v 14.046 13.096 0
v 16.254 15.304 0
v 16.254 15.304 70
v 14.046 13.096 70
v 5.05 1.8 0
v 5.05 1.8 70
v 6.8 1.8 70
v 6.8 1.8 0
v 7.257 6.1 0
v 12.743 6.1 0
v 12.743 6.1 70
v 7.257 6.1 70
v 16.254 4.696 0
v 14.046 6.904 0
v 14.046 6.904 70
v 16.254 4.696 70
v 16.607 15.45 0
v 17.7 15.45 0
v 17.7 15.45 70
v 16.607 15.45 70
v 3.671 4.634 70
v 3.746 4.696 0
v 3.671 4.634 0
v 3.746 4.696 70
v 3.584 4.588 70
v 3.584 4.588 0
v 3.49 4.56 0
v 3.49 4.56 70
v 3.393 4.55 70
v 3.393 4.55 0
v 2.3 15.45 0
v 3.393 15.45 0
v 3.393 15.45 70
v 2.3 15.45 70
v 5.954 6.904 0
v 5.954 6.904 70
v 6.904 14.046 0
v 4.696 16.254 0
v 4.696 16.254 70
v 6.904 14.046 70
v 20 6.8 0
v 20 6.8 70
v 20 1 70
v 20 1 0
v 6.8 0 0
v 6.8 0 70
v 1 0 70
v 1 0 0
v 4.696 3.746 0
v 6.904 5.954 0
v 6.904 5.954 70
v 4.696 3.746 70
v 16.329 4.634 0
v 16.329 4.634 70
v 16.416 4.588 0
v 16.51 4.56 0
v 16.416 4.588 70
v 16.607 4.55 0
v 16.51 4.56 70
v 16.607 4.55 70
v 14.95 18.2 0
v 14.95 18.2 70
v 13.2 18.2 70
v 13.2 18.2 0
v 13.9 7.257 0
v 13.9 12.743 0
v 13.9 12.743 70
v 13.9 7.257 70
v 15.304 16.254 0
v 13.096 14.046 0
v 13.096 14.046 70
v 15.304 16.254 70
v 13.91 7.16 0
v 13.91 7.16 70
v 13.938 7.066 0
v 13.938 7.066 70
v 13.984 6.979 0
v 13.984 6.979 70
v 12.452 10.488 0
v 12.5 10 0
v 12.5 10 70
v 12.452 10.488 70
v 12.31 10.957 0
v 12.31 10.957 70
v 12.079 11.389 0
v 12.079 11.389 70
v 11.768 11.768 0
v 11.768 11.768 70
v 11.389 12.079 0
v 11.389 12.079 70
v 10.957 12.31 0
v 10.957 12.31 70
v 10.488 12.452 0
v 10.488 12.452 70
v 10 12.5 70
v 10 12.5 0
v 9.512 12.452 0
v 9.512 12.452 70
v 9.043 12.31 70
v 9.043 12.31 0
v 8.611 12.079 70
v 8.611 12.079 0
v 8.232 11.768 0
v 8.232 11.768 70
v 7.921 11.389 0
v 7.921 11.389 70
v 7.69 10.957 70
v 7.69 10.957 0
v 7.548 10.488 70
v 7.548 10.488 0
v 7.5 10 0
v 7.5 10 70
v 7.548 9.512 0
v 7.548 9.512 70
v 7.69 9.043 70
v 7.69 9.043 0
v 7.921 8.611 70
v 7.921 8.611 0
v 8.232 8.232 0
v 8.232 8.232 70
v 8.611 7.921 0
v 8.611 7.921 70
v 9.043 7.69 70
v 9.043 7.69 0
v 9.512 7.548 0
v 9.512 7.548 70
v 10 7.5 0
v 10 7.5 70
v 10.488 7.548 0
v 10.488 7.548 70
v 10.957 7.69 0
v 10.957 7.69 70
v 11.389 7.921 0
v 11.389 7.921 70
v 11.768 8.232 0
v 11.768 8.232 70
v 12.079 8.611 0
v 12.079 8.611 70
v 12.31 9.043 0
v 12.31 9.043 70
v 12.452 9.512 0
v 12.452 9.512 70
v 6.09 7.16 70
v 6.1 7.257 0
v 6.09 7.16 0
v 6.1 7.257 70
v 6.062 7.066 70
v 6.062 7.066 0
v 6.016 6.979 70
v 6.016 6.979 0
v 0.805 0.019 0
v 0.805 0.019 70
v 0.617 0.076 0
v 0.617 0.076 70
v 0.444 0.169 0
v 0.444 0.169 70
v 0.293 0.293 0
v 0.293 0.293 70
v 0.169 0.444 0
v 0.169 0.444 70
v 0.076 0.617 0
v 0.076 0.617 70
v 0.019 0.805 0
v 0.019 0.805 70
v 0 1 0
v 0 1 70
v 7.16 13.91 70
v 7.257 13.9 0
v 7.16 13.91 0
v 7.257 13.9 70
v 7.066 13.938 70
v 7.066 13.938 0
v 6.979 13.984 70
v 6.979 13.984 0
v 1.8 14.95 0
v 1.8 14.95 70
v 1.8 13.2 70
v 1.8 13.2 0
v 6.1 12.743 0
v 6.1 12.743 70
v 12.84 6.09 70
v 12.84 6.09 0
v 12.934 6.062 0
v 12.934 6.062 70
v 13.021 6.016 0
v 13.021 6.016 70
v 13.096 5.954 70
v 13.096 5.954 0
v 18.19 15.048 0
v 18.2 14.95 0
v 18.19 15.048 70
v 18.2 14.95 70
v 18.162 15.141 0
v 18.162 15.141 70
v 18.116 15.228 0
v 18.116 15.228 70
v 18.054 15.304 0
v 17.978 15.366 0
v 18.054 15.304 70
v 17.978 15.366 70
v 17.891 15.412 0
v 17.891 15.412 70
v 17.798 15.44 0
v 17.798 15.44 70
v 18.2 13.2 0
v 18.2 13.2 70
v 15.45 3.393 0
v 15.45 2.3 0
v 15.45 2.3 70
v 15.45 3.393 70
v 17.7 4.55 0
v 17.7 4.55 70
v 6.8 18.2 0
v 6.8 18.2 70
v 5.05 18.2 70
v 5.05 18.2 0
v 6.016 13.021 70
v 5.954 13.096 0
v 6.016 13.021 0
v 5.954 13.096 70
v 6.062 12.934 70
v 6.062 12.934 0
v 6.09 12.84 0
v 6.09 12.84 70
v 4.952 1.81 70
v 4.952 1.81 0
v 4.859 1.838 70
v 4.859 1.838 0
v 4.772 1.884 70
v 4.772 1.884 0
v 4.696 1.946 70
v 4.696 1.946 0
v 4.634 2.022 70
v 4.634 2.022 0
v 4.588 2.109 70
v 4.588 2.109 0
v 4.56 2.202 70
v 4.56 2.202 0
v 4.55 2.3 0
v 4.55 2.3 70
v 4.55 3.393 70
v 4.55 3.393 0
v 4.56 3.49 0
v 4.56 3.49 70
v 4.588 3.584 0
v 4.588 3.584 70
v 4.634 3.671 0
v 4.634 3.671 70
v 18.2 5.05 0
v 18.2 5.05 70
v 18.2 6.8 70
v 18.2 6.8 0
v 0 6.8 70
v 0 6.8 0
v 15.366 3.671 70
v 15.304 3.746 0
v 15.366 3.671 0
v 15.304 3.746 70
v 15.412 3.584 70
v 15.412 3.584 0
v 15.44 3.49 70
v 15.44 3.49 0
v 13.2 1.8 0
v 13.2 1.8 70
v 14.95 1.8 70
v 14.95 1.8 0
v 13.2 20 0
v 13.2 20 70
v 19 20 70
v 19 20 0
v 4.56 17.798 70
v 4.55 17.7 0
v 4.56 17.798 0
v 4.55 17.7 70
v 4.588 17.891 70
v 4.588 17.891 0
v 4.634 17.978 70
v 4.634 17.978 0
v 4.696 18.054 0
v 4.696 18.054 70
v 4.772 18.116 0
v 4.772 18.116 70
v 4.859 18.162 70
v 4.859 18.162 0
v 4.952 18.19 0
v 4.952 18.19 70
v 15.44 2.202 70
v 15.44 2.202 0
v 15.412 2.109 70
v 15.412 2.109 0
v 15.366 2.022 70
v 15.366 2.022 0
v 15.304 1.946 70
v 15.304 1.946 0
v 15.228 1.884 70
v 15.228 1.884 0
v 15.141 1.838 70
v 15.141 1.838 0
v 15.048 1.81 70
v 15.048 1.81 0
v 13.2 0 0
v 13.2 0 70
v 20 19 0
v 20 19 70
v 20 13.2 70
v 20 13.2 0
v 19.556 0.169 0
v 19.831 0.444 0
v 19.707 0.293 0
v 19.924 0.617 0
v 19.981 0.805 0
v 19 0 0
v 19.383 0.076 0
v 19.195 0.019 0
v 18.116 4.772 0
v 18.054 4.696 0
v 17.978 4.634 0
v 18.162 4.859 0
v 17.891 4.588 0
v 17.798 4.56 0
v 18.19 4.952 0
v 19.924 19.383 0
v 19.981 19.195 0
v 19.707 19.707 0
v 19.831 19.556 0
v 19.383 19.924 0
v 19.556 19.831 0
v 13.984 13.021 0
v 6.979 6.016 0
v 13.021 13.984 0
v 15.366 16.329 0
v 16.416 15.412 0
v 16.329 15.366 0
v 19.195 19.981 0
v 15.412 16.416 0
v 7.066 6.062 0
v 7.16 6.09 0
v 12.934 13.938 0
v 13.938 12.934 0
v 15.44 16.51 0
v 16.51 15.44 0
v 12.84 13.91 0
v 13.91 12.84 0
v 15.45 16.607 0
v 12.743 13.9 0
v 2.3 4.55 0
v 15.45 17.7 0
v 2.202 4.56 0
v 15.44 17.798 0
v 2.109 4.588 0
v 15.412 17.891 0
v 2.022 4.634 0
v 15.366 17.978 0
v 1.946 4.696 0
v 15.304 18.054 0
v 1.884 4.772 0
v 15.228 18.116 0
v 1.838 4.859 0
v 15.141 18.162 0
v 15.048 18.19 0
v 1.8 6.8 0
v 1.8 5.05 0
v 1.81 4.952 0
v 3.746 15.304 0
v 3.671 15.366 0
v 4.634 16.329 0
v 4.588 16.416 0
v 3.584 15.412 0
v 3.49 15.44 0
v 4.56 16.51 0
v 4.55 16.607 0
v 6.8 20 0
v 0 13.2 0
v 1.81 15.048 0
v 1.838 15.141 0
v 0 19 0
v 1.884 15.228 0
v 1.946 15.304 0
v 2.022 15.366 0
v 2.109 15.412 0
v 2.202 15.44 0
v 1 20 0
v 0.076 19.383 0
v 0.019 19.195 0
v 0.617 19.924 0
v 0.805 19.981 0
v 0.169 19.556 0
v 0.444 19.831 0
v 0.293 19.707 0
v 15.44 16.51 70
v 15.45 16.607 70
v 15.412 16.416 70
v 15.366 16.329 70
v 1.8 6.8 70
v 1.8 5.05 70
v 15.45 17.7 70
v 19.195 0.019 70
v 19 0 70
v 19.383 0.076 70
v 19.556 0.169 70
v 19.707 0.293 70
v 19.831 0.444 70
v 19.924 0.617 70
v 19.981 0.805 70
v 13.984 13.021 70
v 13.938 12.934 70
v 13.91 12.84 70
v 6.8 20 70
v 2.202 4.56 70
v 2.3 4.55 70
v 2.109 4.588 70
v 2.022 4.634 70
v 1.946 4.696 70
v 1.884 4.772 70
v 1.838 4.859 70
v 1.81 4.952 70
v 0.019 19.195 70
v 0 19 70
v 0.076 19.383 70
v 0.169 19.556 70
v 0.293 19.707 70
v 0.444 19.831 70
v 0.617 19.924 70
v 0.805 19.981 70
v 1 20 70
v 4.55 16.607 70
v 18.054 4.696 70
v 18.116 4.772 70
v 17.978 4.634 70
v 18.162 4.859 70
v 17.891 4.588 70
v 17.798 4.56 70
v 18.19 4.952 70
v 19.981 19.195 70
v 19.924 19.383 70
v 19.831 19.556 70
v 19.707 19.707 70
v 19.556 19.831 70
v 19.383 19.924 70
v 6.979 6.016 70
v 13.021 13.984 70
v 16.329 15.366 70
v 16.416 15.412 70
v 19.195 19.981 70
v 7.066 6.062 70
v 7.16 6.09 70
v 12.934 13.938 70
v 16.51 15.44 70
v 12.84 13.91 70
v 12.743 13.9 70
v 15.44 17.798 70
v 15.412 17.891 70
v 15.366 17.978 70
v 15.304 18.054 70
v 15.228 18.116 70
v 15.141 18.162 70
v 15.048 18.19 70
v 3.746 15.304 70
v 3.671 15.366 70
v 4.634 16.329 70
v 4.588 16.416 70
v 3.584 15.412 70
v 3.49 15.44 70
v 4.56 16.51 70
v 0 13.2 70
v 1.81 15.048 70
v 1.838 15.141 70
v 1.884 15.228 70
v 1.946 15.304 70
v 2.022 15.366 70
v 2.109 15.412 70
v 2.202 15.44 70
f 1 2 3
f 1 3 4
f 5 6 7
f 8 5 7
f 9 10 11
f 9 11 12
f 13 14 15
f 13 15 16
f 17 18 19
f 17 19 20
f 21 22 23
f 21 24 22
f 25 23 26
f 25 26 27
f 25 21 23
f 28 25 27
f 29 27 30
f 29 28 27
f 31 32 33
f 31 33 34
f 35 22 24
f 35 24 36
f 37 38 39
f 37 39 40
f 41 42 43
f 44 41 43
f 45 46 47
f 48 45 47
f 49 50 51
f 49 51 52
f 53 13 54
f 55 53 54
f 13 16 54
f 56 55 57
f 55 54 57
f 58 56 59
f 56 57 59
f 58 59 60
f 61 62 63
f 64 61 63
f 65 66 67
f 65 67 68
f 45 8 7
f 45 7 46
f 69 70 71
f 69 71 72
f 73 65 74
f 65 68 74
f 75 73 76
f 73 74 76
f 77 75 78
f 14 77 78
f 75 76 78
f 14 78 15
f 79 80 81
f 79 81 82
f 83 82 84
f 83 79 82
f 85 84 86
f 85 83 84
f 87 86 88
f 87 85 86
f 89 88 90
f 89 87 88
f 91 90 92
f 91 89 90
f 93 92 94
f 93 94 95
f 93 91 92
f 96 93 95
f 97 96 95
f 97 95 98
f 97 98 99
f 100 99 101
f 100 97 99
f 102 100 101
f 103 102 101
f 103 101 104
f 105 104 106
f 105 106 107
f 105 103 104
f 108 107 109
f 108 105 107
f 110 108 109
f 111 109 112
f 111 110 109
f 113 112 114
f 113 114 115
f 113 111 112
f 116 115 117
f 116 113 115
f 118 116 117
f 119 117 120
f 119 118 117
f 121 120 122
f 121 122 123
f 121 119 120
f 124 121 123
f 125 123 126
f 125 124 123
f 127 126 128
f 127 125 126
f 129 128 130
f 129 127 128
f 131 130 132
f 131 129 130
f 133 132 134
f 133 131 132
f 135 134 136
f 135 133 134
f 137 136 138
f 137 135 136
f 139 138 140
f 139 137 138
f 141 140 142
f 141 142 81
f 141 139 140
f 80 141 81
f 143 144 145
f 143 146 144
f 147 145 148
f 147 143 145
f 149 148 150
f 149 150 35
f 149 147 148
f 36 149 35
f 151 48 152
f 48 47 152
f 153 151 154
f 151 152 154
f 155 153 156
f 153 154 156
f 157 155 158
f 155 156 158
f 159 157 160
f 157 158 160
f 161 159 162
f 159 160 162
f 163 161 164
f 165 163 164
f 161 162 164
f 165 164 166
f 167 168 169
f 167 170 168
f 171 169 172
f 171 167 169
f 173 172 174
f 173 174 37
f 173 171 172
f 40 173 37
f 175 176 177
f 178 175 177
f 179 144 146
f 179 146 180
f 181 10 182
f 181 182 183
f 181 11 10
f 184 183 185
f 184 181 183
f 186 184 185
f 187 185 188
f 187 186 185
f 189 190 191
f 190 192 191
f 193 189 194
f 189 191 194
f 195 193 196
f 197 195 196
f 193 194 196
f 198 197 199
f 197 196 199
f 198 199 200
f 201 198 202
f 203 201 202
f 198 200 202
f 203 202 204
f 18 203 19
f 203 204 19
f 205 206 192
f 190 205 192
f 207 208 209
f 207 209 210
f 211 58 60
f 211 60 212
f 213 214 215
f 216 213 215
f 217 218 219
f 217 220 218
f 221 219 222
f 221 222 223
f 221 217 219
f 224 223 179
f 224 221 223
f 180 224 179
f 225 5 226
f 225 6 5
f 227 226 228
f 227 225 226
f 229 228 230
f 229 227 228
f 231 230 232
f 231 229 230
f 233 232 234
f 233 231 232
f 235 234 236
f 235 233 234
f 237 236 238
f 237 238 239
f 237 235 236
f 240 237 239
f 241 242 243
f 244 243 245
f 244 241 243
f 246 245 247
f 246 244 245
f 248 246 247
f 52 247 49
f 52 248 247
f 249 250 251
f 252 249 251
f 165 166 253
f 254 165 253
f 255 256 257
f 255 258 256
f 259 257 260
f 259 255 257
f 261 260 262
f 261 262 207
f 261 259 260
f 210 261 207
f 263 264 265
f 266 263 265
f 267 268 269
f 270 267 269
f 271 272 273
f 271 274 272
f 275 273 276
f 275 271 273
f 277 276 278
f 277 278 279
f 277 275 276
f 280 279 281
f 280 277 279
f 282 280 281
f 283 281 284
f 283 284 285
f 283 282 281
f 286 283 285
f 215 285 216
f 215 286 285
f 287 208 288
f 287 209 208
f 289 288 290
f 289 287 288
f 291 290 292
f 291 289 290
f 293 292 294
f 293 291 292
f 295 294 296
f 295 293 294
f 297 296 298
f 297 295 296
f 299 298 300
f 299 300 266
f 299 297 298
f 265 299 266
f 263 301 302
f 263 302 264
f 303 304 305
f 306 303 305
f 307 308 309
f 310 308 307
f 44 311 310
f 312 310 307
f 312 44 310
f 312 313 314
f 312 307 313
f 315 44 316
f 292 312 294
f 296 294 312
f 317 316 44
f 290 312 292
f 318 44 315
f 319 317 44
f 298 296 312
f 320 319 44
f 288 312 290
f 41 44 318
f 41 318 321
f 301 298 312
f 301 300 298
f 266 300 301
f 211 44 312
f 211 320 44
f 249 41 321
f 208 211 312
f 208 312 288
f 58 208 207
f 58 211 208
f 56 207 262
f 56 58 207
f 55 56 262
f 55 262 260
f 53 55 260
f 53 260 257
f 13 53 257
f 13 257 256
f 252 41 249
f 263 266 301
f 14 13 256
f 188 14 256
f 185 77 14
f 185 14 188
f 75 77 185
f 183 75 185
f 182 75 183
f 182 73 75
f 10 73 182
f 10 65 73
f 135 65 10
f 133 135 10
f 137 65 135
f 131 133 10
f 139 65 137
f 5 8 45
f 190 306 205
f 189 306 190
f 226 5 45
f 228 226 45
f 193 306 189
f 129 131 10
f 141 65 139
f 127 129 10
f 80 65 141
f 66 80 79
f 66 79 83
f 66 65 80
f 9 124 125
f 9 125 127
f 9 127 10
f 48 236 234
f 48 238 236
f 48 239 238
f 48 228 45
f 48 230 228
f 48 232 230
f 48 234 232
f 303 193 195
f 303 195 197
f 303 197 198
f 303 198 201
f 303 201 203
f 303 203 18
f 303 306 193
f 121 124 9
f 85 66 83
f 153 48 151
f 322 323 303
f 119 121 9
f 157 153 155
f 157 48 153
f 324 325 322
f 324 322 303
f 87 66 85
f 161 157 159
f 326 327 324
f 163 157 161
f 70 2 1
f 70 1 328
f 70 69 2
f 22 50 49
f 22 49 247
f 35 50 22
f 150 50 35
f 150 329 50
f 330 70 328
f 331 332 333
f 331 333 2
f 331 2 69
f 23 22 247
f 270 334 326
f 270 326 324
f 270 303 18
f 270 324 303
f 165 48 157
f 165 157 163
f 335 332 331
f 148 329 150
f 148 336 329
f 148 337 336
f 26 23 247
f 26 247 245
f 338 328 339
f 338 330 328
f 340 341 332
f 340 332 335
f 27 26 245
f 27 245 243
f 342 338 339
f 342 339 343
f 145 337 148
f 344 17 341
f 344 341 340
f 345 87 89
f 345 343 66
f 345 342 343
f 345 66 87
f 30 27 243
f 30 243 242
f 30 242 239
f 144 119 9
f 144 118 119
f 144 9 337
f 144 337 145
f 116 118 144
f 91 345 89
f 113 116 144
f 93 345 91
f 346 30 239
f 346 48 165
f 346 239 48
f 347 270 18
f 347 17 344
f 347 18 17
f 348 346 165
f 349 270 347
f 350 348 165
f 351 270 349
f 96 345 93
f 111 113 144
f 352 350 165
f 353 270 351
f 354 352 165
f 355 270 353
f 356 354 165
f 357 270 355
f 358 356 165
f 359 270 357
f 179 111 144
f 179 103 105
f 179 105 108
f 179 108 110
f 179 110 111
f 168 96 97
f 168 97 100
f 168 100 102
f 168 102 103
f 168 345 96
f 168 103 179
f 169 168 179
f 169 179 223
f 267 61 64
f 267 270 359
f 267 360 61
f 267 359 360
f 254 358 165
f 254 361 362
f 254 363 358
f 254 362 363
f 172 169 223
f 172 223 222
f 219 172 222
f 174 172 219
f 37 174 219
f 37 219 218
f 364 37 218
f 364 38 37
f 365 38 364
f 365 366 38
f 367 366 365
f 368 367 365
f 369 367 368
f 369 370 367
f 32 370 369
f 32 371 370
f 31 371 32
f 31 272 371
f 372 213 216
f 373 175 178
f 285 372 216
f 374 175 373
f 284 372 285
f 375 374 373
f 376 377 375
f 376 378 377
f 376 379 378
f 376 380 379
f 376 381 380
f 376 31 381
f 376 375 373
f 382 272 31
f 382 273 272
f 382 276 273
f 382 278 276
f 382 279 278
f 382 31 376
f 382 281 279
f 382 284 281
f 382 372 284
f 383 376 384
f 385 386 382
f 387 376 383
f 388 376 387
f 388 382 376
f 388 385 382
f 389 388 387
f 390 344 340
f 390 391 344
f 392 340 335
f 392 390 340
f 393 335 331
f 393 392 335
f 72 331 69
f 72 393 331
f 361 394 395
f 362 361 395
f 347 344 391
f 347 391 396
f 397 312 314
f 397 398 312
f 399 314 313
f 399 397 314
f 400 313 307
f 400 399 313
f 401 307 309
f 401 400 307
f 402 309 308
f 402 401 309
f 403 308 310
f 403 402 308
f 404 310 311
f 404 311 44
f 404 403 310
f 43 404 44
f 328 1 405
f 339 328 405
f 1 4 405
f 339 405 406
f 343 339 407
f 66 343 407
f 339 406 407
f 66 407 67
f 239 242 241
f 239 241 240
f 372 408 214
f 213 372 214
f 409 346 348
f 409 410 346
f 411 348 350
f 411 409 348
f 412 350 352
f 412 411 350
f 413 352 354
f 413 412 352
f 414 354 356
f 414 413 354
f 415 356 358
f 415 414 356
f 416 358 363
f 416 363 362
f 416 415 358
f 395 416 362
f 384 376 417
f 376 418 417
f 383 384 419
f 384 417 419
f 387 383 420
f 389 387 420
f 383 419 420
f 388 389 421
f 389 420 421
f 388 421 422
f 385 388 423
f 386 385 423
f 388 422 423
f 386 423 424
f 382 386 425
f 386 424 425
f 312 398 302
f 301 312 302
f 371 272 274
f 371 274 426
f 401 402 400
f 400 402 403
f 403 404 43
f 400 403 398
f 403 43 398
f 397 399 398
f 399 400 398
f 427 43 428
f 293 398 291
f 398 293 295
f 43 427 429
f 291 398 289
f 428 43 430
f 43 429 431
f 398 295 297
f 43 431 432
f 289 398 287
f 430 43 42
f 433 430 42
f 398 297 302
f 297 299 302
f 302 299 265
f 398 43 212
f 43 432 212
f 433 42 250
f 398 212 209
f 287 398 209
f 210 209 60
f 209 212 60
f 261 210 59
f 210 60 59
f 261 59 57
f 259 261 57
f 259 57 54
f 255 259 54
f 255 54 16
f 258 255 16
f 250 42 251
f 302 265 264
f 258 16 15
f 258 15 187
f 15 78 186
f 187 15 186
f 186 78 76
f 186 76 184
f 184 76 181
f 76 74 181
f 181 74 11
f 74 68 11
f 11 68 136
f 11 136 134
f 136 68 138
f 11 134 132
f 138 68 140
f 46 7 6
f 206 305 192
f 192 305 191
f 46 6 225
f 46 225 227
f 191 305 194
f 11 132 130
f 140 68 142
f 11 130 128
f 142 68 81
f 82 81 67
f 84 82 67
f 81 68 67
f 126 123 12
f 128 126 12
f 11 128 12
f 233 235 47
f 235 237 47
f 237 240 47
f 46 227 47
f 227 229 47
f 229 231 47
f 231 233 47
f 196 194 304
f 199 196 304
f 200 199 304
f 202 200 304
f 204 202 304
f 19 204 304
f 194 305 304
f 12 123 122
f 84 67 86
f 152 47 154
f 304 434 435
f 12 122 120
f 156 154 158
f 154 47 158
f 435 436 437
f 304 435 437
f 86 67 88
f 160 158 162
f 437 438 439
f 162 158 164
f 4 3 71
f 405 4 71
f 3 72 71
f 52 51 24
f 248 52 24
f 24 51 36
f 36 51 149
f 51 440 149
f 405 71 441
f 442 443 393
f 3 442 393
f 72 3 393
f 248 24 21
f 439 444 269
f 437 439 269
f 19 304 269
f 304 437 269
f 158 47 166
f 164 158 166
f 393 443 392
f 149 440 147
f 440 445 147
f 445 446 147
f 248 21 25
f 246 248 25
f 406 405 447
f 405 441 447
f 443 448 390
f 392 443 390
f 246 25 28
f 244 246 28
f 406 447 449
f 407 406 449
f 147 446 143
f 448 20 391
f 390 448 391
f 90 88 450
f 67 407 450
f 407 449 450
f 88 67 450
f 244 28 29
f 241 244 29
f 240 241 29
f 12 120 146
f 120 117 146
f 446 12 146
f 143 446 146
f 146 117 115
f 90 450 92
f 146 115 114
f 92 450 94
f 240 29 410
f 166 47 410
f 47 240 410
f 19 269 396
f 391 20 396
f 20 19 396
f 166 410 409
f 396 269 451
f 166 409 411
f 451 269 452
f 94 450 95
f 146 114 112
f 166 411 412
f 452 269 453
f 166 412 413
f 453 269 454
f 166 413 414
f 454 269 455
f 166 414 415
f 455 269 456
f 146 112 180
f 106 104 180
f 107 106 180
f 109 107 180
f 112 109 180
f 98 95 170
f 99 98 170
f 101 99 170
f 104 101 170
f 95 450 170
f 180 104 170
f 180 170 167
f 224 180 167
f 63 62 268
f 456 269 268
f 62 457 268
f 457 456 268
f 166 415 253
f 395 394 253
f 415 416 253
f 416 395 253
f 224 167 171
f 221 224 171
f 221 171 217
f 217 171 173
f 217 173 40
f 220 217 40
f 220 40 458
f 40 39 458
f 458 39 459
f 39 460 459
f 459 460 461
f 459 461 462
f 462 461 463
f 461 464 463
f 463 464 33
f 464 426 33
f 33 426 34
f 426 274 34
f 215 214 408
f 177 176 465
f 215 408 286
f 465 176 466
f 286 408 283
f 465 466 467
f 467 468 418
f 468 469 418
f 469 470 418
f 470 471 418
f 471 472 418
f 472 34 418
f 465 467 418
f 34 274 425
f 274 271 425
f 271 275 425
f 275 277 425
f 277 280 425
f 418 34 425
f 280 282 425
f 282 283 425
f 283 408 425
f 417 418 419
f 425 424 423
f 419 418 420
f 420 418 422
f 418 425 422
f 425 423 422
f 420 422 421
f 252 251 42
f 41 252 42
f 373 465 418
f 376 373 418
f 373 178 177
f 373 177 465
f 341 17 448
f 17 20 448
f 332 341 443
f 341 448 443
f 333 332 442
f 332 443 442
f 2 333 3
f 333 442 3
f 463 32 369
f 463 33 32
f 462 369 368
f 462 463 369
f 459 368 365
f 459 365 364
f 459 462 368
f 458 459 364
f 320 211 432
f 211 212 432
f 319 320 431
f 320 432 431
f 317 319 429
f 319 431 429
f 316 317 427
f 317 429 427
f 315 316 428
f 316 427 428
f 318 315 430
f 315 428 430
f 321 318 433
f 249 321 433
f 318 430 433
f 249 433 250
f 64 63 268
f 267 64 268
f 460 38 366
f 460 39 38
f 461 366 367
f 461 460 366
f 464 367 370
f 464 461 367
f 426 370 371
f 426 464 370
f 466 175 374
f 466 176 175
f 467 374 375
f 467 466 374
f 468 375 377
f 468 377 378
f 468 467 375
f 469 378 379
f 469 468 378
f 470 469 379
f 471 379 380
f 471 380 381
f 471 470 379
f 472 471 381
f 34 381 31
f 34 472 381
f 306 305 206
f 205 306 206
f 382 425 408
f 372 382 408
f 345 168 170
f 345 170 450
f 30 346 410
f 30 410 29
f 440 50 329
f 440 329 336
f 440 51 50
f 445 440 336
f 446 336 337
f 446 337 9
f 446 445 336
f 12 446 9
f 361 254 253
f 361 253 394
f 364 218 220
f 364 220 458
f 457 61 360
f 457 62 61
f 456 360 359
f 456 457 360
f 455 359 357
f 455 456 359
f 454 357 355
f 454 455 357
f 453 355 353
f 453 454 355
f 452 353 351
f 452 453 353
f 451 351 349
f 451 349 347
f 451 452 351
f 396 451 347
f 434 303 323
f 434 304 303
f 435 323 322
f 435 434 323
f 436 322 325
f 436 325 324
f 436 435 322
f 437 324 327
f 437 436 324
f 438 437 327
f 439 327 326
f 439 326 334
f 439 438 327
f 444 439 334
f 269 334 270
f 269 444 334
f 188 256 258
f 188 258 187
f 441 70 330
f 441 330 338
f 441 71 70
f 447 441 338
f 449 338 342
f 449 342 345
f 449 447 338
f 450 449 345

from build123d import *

# Parameters (mm, degrees)
SKETCH1_R           = 2.5
BOSS_EXTRUDE1_DEPTH = 70
FILLET1_R           = 1
FILLET2_R           = 0.5
FILLET3_R           = 0.5
FILLET4_R           = 0.5
FILLET5_R           = 0.5


with BuildPart() as part:
    # Sketch1 → Boss-Extrude1 (new body)
    with BuildSketch(Plane.XY):
        Polygon((13.2, 0), (13.2, 1.8), (15.45, 1.8), (15.45, 3.6), (12.95, 6.1), (7.05, 6.1), (4.55, 3.6), (4.55, 1.8), (6.8, 1.8), (6.8, 0), (0, 0), (0, 6.8), (1.8, 6.8), (1.8, 4.55), (3.6, 4.55), (6.1, 7.05), (6.1, 12.95), (3.6, 15.45), (1.8, 15.45), (1.8, 13.2), (0, 13.2), (0, 20), (6.8, 20), (6.8, 18.2), (4.55, 18.2), (4.55, 16.4), (7.05, 13.9), (12.95, 13.9), (15.45, 16.4), (15.45, 18.2), (13.2, 18.2), (13.2, 20), (20, 20), (20, 13.2), (18.2, 13.2), (18.2, 15.45), (16.4, 15.45), (13.9, 12.95), (13.9, 7.05), (16.4, 4.55), (18.2, 4.55), (18.2, 6.8), (20, 6.8), (20, 0), align=None)
        with Locations((10, 10)):
            Circle(SKETCH1_R, mode=Mode.SUBTRACT)
    extrude(amount=BOSS_EXTRUDE1_DEPTH)

    # Fillet1
    fillet1_edges = [part.edges().sort_by_distance(p)[0] for p in [
        (0, 0, 35),
        (0, 20, 35),
        (20, 20, 35),
        (20, 0, 35),
    ]]
    fillet(fillet1_edges, radius=FILLET1_R)

    # Fillet2
    fillet2_edges = [part.edges().sort_by_distance(p)[0] for p in [
        (4.55, 18.2, 35),
        (4.55, 16.4, 35),
        (7.05, 13.9, 35),
        (12.95, 13.9, 35),
        (15.45, 16.4, 35),
        (15.45, 18.2, 35),
    ]]
    fillet(fillet2_edges, radius=FILLET2_R)

    # Fillet3
    fillet3_edges = [part.edges().sort_by_distance(p)[0] for p in [
        (18.2, 15.45, 35),
        (16.4, 15.45, 35),
        (13.9, 12.95, 35),
        (13.9, 7.05, 35),
        (16.4, 4.55, 35),
        (18.2, 4.55, 35),
    ]]
    fillet(fillet3_edges, radius=FILLET3_R)

    # Fillet4
    fillet4_edges = [part.edges().sort_by_distance(p)[0] for p in [
        (1.8, 4.55, 35),
        (3.6, 4.55, 35),
        (6.1, 7.05, 35),
        (6.1, 12.95, 35),
        (3.6, 15.45, 35),
        (1.8, 15.45, 35),
    ]]
    fillet(fillet4_edges, radius=FILLET4_R)

    # Fillet5
    fillet5_edges = [part.edges().sort_by_distance(p)[0] for p in [
        (15.45, 1.8, 35),
        (15.45, 3.6, 35),
        (12.95, 6.1, 35),
        (7.05, 6.1, 35),
        (4.55, 3.6, 35),
        (4.55, 1.8, 35),
    ]]
    fillet(fillet5_edges, radius=FILLET5_R)


solid = part.part
